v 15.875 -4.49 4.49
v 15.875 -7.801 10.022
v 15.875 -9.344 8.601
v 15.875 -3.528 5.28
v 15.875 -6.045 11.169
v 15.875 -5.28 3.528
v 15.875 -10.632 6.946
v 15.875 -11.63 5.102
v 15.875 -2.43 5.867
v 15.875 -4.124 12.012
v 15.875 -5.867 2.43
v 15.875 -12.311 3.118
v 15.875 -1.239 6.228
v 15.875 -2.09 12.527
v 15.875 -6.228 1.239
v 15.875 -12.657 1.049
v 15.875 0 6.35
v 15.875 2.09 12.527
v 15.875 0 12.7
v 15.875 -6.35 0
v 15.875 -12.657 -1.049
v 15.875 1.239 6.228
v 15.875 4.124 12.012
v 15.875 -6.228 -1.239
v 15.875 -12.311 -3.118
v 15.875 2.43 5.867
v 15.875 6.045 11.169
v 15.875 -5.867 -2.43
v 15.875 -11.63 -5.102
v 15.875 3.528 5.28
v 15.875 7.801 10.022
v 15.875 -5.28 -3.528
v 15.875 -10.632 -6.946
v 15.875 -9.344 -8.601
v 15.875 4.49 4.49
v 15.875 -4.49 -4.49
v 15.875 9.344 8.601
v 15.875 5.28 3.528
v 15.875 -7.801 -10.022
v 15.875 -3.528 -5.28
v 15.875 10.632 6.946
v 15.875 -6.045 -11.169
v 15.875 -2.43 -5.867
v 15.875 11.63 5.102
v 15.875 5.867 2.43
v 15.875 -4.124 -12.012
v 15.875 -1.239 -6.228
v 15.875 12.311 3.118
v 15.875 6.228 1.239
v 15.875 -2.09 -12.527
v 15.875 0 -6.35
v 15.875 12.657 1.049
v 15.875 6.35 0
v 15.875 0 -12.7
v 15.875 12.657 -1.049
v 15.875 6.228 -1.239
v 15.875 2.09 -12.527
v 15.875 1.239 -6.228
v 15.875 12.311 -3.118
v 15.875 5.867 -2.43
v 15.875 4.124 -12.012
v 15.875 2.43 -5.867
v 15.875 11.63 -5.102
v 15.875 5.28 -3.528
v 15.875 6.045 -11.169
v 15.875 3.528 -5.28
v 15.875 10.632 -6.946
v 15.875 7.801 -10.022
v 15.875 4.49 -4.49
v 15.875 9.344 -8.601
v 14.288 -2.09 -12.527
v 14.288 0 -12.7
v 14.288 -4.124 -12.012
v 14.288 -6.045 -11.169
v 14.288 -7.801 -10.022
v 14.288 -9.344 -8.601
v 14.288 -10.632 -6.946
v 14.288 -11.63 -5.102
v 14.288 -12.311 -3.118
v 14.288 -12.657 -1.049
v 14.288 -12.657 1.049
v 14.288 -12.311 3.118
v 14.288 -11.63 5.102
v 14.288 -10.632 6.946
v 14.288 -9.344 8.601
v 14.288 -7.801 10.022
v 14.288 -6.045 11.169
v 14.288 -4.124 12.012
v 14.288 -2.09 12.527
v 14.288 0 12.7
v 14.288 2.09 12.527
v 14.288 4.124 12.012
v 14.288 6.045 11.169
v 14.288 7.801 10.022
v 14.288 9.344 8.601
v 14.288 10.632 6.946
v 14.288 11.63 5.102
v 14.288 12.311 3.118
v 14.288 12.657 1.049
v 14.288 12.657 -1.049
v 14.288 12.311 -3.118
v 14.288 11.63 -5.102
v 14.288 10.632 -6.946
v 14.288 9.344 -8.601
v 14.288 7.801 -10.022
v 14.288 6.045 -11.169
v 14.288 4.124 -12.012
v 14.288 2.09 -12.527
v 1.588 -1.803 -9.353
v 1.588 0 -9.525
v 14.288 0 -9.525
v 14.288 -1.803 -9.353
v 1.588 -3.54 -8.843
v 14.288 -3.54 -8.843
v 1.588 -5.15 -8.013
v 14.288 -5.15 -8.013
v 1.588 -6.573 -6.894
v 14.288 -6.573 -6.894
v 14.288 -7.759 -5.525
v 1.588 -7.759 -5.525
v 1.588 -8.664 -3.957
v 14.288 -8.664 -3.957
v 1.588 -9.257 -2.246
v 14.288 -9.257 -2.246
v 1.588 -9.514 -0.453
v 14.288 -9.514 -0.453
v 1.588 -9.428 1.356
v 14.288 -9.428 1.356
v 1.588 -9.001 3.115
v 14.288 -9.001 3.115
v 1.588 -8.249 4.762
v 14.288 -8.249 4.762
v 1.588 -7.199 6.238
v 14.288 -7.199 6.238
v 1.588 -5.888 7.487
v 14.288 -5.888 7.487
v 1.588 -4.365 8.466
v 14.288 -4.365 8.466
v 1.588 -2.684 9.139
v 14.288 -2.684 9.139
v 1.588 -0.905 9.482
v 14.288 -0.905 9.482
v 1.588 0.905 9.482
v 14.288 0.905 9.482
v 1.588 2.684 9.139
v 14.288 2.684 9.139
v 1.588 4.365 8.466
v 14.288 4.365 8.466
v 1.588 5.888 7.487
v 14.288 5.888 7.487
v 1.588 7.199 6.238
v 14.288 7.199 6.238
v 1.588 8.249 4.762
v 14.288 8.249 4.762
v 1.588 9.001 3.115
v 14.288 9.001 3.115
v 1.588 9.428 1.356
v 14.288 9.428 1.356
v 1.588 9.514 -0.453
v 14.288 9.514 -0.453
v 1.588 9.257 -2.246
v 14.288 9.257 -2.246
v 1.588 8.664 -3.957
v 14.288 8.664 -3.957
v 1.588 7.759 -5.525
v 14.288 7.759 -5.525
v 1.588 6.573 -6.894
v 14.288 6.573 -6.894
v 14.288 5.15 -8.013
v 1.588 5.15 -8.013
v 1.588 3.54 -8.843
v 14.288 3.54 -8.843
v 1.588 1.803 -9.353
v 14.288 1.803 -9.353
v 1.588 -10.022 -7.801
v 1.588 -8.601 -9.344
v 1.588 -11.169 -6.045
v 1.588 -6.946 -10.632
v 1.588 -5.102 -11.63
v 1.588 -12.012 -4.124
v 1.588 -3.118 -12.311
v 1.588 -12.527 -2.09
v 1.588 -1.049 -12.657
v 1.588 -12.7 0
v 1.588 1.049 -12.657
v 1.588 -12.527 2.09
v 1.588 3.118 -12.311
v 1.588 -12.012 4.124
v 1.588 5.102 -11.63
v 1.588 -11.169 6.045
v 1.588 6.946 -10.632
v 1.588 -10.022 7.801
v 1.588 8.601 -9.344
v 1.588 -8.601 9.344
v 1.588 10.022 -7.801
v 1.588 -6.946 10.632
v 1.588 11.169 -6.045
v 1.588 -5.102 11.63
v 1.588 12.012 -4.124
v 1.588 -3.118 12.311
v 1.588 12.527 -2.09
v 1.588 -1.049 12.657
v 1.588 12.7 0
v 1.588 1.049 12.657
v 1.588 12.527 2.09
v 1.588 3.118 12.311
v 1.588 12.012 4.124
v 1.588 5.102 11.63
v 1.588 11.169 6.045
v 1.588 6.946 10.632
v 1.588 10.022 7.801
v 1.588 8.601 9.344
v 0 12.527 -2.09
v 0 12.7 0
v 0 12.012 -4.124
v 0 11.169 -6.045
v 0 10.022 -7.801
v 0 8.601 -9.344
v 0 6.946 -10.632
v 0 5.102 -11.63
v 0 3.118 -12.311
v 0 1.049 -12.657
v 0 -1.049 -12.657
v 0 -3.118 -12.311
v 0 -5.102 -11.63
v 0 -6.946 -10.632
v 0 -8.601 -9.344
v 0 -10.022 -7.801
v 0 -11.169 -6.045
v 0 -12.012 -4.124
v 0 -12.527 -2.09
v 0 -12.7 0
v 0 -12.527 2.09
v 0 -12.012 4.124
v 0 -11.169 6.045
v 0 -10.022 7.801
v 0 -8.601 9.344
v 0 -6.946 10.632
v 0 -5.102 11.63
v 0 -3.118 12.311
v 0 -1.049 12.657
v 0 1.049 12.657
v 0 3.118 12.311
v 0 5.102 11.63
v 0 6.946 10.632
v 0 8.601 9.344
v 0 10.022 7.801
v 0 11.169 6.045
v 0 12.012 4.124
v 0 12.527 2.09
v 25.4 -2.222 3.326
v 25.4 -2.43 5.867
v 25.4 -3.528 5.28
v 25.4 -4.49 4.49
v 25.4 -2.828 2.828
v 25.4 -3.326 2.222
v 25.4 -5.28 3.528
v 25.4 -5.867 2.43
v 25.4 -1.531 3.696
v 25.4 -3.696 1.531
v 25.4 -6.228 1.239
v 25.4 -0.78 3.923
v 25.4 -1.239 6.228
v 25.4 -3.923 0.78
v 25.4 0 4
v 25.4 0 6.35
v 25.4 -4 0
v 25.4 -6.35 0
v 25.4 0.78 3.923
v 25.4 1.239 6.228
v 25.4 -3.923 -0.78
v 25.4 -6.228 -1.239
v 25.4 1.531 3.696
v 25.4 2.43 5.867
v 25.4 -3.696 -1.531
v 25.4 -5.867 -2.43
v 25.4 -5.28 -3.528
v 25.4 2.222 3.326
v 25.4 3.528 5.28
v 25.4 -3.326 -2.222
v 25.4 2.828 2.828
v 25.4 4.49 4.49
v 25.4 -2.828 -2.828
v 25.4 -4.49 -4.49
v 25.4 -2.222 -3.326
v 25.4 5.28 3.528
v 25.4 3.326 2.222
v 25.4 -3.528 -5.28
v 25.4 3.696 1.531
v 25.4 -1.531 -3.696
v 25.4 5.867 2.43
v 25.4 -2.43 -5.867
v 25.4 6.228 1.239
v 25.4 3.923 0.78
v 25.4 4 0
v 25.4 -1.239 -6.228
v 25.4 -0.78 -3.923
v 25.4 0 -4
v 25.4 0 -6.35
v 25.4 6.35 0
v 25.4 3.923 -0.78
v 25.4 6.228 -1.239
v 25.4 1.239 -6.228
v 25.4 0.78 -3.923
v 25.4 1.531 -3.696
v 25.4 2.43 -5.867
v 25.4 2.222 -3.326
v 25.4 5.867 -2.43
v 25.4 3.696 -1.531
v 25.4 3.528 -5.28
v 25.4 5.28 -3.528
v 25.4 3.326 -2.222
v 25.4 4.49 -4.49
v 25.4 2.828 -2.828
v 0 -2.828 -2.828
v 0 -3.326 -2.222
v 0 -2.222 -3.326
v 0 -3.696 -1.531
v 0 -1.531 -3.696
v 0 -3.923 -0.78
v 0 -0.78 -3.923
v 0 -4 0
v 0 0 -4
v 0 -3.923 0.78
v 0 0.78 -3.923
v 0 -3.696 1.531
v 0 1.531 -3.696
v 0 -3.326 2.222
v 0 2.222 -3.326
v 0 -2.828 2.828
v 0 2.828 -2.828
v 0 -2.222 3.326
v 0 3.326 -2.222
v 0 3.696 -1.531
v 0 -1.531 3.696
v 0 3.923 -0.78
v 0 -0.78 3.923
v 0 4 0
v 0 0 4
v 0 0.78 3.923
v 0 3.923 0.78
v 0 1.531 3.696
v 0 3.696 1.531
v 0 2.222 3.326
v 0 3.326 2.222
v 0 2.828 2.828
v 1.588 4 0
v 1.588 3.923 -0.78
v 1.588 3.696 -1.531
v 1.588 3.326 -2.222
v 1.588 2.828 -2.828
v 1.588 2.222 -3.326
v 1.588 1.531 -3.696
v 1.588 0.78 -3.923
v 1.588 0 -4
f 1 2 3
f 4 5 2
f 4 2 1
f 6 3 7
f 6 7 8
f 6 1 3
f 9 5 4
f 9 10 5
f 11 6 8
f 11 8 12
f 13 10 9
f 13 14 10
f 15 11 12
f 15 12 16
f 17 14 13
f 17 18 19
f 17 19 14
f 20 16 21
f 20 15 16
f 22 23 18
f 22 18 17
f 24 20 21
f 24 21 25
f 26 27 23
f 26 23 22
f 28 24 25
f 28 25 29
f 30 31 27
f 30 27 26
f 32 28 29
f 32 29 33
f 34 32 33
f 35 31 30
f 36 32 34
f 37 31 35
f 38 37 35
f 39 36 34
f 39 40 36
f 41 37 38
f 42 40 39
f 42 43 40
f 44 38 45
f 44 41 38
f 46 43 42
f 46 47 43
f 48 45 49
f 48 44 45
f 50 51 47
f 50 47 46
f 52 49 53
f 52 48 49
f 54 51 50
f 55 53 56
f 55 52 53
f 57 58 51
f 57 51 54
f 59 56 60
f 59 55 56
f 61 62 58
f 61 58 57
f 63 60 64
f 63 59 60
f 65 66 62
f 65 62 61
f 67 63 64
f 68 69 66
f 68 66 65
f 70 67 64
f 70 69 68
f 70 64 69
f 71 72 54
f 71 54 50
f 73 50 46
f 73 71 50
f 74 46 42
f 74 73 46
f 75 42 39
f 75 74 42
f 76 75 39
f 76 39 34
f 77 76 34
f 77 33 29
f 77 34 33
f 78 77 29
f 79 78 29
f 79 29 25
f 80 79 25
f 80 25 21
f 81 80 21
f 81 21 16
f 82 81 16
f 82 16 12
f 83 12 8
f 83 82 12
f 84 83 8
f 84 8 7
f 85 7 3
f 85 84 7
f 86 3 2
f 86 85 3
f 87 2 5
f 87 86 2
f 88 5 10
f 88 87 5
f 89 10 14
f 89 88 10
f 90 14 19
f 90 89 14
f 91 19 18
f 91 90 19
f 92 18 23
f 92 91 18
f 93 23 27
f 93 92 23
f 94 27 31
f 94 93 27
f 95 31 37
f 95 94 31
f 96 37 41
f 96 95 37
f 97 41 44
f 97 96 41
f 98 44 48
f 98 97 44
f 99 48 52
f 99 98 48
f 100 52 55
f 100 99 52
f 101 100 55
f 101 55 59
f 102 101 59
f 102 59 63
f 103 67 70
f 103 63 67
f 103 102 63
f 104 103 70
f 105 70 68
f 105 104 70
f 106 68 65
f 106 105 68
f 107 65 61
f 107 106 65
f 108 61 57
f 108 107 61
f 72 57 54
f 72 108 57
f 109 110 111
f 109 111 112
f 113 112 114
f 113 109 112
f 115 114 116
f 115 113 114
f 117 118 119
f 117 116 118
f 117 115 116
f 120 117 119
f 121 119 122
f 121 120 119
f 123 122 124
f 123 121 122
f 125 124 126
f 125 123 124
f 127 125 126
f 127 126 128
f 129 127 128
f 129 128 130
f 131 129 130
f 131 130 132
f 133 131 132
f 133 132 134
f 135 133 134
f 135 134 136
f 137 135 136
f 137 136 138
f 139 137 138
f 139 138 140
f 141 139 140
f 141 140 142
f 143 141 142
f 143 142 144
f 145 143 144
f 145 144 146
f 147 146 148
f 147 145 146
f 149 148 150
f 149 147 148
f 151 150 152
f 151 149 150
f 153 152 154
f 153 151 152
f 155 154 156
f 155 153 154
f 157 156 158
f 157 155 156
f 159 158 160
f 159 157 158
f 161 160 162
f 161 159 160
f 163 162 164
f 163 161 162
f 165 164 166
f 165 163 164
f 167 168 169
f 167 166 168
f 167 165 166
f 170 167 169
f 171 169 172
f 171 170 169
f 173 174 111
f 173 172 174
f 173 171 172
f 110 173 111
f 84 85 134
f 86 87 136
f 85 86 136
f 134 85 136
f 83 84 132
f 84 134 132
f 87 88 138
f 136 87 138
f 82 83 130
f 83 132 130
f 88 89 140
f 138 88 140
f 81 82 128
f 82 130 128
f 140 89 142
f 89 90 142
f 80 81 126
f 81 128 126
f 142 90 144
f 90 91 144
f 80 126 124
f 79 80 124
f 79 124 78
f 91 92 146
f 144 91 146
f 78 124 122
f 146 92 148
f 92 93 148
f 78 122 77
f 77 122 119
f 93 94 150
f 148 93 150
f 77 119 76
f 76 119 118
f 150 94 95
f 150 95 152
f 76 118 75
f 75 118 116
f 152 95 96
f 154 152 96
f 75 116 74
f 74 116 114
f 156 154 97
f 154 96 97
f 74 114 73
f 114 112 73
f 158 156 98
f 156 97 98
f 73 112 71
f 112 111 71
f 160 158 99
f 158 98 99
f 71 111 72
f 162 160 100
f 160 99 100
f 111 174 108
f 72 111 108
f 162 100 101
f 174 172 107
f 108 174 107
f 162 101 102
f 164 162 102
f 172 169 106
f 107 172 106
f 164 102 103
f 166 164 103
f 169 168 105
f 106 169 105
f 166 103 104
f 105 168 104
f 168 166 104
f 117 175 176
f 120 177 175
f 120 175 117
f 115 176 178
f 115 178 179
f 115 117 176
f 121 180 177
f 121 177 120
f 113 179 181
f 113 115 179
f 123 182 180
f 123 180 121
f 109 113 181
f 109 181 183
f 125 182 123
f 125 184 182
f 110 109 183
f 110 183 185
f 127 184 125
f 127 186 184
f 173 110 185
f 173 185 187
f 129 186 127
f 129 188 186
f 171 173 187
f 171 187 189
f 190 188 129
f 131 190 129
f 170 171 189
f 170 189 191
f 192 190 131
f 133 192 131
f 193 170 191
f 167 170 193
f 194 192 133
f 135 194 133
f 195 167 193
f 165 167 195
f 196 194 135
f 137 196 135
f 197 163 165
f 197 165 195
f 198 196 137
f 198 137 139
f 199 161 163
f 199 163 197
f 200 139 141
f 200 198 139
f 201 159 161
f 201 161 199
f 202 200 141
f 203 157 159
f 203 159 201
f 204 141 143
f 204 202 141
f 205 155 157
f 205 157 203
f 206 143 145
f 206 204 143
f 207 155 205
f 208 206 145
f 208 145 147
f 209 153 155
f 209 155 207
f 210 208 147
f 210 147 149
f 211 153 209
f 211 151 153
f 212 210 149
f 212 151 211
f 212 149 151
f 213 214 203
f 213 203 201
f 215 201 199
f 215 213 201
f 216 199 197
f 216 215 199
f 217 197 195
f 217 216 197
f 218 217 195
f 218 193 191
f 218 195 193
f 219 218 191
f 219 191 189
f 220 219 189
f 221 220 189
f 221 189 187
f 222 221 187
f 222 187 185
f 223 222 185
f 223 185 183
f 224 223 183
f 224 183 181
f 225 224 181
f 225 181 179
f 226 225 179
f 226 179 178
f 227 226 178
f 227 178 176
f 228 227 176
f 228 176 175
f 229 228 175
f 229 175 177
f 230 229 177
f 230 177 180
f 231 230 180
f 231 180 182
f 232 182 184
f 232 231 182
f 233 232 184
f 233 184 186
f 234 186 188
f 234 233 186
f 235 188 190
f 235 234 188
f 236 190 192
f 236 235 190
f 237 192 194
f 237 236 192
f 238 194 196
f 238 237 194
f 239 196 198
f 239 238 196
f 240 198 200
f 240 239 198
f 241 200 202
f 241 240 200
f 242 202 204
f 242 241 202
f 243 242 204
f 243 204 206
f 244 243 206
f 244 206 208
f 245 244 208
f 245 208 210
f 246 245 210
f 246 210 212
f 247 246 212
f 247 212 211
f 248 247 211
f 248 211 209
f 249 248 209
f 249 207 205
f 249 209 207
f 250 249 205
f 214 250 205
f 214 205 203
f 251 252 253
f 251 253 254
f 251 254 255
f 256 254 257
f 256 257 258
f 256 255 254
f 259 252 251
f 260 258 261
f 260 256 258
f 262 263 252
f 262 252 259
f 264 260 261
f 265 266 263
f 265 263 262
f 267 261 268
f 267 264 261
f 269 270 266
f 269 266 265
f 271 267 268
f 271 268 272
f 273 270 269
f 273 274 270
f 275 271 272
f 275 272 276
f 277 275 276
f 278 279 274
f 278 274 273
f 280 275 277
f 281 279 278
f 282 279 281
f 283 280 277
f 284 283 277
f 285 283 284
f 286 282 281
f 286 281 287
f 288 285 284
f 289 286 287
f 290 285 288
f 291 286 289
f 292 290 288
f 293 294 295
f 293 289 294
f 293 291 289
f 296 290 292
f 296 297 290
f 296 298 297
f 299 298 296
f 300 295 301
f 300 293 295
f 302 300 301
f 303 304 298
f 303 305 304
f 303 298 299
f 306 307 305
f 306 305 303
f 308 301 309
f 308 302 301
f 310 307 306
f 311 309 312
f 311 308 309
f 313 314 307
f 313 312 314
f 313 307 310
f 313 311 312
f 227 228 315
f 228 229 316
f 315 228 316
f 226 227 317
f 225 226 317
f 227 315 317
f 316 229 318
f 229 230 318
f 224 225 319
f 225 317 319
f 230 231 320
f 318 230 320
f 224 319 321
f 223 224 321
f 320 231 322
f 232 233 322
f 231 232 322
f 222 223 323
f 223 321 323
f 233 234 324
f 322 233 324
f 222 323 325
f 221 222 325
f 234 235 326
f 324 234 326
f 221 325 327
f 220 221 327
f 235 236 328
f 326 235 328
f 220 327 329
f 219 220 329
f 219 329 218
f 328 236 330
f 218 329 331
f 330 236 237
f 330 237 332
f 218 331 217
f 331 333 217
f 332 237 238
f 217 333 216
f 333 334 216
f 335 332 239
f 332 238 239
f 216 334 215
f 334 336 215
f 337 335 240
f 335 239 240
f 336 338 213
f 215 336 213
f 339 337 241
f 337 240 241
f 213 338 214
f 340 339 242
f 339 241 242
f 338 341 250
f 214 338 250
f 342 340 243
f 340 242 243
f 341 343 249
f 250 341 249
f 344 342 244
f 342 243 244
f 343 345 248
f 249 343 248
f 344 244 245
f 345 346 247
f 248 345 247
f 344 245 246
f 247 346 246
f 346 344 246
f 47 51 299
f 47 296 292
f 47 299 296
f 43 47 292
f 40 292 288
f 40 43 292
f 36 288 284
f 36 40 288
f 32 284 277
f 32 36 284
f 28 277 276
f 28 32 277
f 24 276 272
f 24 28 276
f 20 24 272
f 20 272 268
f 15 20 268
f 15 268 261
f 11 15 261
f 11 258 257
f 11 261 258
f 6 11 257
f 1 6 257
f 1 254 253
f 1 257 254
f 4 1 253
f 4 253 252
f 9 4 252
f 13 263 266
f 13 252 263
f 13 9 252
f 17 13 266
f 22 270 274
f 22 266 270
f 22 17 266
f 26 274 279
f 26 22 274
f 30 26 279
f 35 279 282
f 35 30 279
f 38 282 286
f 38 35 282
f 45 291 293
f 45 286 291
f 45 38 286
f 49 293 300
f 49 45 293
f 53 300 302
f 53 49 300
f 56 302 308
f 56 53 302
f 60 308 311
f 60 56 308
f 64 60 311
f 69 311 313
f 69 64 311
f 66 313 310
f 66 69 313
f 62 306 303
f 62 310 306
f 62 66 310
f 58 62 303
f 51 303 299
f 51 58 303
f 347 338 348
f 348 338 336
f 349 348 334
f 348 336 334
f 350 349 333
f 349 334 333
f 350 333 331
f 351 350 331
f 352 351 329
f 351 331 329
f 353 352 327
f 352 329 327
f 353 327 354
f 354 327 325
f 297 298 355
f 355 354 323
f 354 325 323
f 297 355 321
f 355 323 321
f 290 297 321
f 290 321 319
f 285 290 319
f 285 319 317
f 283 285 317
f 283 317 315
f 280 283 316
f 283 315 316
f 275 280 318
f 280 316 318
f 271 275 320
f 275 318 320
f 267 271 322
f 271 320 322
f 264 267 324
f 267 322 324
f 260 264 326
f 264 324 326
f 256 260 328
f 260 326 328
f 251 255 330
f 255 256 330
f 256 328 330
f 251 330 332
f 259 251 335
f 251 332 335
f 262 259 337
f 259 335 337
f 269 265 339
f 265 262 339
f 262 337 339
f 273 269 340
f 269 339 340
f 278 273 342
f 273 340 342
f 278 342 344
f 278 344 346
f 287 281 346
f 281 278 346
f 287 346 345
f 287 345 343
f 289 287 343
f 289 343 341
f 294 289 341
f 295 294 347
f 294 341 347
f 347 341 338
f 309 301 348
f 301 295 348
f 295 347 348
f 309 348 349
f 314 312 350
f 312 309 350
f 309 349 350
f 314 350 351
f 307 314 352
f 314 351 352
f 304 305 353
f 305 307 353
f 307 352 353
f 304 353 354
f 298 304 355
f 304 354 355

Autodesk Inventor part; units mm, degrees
ref_plane "YZ Plane" through (0, 0, 0) normal (1, 0, 0) x (0, 1, 0)
ref_plane "XZ Plane" through (0, 0, 0) normal (0, 1, 0) x (-1, 0, 0)
ref_plane "XY Plane" through (0, 0, 0) normal (0, 0, 1) x (1, 0, 0)
sketch "Sketch1" plane through (0, 0, 0) normal (1, 0, 0) x (0, 1, 0)
  circle A0 centre (0, 0) radius 12.7
  circle A1 centre (0, 0) radius 4
  dimension "d0" = 25.4
  dimension "d9" = 8
extrude "Extrusion1" add sketch "Sketch1" along normal blind 1.5875
sketch "Sketch2" plane through (1.5875, 0, 0) normal (1, 0, 0) x (0, 0, -1)
  circle A0 centre (0, 0) radius 9.525
  circle A1 centre (0, 0) radius 4 projected
  dimension "d4" = 19.05
extrude "Extrusion2" add sketch "Sketch2" along normal blind 12.7
sketch "Sketch3" plane through (14.2875, 0, 0) normal (1, 0, 0) x (0, 0, -1)
  circle A0 centre (0, 0) radius 12.7 projected
  circle A1 centre (0, 0) radius 4 projected
extrude "Extrusion3" add sketch "Sketch3" along normal blind 1.5875
sketch "Sketch4" plane through (15.875, 0, 0) normal (1, 0, 0) x (0, 0, -1)
  circle A0 centre (0, 0) radius 6.35
  circle A1 centre (0, 0) radius 4 projected
  dimension "d10" = 12.7
extrude "Extrusion4" add sketch "Sketch4" along normal blind 9.525
properties part number "12T XL Pulley"
